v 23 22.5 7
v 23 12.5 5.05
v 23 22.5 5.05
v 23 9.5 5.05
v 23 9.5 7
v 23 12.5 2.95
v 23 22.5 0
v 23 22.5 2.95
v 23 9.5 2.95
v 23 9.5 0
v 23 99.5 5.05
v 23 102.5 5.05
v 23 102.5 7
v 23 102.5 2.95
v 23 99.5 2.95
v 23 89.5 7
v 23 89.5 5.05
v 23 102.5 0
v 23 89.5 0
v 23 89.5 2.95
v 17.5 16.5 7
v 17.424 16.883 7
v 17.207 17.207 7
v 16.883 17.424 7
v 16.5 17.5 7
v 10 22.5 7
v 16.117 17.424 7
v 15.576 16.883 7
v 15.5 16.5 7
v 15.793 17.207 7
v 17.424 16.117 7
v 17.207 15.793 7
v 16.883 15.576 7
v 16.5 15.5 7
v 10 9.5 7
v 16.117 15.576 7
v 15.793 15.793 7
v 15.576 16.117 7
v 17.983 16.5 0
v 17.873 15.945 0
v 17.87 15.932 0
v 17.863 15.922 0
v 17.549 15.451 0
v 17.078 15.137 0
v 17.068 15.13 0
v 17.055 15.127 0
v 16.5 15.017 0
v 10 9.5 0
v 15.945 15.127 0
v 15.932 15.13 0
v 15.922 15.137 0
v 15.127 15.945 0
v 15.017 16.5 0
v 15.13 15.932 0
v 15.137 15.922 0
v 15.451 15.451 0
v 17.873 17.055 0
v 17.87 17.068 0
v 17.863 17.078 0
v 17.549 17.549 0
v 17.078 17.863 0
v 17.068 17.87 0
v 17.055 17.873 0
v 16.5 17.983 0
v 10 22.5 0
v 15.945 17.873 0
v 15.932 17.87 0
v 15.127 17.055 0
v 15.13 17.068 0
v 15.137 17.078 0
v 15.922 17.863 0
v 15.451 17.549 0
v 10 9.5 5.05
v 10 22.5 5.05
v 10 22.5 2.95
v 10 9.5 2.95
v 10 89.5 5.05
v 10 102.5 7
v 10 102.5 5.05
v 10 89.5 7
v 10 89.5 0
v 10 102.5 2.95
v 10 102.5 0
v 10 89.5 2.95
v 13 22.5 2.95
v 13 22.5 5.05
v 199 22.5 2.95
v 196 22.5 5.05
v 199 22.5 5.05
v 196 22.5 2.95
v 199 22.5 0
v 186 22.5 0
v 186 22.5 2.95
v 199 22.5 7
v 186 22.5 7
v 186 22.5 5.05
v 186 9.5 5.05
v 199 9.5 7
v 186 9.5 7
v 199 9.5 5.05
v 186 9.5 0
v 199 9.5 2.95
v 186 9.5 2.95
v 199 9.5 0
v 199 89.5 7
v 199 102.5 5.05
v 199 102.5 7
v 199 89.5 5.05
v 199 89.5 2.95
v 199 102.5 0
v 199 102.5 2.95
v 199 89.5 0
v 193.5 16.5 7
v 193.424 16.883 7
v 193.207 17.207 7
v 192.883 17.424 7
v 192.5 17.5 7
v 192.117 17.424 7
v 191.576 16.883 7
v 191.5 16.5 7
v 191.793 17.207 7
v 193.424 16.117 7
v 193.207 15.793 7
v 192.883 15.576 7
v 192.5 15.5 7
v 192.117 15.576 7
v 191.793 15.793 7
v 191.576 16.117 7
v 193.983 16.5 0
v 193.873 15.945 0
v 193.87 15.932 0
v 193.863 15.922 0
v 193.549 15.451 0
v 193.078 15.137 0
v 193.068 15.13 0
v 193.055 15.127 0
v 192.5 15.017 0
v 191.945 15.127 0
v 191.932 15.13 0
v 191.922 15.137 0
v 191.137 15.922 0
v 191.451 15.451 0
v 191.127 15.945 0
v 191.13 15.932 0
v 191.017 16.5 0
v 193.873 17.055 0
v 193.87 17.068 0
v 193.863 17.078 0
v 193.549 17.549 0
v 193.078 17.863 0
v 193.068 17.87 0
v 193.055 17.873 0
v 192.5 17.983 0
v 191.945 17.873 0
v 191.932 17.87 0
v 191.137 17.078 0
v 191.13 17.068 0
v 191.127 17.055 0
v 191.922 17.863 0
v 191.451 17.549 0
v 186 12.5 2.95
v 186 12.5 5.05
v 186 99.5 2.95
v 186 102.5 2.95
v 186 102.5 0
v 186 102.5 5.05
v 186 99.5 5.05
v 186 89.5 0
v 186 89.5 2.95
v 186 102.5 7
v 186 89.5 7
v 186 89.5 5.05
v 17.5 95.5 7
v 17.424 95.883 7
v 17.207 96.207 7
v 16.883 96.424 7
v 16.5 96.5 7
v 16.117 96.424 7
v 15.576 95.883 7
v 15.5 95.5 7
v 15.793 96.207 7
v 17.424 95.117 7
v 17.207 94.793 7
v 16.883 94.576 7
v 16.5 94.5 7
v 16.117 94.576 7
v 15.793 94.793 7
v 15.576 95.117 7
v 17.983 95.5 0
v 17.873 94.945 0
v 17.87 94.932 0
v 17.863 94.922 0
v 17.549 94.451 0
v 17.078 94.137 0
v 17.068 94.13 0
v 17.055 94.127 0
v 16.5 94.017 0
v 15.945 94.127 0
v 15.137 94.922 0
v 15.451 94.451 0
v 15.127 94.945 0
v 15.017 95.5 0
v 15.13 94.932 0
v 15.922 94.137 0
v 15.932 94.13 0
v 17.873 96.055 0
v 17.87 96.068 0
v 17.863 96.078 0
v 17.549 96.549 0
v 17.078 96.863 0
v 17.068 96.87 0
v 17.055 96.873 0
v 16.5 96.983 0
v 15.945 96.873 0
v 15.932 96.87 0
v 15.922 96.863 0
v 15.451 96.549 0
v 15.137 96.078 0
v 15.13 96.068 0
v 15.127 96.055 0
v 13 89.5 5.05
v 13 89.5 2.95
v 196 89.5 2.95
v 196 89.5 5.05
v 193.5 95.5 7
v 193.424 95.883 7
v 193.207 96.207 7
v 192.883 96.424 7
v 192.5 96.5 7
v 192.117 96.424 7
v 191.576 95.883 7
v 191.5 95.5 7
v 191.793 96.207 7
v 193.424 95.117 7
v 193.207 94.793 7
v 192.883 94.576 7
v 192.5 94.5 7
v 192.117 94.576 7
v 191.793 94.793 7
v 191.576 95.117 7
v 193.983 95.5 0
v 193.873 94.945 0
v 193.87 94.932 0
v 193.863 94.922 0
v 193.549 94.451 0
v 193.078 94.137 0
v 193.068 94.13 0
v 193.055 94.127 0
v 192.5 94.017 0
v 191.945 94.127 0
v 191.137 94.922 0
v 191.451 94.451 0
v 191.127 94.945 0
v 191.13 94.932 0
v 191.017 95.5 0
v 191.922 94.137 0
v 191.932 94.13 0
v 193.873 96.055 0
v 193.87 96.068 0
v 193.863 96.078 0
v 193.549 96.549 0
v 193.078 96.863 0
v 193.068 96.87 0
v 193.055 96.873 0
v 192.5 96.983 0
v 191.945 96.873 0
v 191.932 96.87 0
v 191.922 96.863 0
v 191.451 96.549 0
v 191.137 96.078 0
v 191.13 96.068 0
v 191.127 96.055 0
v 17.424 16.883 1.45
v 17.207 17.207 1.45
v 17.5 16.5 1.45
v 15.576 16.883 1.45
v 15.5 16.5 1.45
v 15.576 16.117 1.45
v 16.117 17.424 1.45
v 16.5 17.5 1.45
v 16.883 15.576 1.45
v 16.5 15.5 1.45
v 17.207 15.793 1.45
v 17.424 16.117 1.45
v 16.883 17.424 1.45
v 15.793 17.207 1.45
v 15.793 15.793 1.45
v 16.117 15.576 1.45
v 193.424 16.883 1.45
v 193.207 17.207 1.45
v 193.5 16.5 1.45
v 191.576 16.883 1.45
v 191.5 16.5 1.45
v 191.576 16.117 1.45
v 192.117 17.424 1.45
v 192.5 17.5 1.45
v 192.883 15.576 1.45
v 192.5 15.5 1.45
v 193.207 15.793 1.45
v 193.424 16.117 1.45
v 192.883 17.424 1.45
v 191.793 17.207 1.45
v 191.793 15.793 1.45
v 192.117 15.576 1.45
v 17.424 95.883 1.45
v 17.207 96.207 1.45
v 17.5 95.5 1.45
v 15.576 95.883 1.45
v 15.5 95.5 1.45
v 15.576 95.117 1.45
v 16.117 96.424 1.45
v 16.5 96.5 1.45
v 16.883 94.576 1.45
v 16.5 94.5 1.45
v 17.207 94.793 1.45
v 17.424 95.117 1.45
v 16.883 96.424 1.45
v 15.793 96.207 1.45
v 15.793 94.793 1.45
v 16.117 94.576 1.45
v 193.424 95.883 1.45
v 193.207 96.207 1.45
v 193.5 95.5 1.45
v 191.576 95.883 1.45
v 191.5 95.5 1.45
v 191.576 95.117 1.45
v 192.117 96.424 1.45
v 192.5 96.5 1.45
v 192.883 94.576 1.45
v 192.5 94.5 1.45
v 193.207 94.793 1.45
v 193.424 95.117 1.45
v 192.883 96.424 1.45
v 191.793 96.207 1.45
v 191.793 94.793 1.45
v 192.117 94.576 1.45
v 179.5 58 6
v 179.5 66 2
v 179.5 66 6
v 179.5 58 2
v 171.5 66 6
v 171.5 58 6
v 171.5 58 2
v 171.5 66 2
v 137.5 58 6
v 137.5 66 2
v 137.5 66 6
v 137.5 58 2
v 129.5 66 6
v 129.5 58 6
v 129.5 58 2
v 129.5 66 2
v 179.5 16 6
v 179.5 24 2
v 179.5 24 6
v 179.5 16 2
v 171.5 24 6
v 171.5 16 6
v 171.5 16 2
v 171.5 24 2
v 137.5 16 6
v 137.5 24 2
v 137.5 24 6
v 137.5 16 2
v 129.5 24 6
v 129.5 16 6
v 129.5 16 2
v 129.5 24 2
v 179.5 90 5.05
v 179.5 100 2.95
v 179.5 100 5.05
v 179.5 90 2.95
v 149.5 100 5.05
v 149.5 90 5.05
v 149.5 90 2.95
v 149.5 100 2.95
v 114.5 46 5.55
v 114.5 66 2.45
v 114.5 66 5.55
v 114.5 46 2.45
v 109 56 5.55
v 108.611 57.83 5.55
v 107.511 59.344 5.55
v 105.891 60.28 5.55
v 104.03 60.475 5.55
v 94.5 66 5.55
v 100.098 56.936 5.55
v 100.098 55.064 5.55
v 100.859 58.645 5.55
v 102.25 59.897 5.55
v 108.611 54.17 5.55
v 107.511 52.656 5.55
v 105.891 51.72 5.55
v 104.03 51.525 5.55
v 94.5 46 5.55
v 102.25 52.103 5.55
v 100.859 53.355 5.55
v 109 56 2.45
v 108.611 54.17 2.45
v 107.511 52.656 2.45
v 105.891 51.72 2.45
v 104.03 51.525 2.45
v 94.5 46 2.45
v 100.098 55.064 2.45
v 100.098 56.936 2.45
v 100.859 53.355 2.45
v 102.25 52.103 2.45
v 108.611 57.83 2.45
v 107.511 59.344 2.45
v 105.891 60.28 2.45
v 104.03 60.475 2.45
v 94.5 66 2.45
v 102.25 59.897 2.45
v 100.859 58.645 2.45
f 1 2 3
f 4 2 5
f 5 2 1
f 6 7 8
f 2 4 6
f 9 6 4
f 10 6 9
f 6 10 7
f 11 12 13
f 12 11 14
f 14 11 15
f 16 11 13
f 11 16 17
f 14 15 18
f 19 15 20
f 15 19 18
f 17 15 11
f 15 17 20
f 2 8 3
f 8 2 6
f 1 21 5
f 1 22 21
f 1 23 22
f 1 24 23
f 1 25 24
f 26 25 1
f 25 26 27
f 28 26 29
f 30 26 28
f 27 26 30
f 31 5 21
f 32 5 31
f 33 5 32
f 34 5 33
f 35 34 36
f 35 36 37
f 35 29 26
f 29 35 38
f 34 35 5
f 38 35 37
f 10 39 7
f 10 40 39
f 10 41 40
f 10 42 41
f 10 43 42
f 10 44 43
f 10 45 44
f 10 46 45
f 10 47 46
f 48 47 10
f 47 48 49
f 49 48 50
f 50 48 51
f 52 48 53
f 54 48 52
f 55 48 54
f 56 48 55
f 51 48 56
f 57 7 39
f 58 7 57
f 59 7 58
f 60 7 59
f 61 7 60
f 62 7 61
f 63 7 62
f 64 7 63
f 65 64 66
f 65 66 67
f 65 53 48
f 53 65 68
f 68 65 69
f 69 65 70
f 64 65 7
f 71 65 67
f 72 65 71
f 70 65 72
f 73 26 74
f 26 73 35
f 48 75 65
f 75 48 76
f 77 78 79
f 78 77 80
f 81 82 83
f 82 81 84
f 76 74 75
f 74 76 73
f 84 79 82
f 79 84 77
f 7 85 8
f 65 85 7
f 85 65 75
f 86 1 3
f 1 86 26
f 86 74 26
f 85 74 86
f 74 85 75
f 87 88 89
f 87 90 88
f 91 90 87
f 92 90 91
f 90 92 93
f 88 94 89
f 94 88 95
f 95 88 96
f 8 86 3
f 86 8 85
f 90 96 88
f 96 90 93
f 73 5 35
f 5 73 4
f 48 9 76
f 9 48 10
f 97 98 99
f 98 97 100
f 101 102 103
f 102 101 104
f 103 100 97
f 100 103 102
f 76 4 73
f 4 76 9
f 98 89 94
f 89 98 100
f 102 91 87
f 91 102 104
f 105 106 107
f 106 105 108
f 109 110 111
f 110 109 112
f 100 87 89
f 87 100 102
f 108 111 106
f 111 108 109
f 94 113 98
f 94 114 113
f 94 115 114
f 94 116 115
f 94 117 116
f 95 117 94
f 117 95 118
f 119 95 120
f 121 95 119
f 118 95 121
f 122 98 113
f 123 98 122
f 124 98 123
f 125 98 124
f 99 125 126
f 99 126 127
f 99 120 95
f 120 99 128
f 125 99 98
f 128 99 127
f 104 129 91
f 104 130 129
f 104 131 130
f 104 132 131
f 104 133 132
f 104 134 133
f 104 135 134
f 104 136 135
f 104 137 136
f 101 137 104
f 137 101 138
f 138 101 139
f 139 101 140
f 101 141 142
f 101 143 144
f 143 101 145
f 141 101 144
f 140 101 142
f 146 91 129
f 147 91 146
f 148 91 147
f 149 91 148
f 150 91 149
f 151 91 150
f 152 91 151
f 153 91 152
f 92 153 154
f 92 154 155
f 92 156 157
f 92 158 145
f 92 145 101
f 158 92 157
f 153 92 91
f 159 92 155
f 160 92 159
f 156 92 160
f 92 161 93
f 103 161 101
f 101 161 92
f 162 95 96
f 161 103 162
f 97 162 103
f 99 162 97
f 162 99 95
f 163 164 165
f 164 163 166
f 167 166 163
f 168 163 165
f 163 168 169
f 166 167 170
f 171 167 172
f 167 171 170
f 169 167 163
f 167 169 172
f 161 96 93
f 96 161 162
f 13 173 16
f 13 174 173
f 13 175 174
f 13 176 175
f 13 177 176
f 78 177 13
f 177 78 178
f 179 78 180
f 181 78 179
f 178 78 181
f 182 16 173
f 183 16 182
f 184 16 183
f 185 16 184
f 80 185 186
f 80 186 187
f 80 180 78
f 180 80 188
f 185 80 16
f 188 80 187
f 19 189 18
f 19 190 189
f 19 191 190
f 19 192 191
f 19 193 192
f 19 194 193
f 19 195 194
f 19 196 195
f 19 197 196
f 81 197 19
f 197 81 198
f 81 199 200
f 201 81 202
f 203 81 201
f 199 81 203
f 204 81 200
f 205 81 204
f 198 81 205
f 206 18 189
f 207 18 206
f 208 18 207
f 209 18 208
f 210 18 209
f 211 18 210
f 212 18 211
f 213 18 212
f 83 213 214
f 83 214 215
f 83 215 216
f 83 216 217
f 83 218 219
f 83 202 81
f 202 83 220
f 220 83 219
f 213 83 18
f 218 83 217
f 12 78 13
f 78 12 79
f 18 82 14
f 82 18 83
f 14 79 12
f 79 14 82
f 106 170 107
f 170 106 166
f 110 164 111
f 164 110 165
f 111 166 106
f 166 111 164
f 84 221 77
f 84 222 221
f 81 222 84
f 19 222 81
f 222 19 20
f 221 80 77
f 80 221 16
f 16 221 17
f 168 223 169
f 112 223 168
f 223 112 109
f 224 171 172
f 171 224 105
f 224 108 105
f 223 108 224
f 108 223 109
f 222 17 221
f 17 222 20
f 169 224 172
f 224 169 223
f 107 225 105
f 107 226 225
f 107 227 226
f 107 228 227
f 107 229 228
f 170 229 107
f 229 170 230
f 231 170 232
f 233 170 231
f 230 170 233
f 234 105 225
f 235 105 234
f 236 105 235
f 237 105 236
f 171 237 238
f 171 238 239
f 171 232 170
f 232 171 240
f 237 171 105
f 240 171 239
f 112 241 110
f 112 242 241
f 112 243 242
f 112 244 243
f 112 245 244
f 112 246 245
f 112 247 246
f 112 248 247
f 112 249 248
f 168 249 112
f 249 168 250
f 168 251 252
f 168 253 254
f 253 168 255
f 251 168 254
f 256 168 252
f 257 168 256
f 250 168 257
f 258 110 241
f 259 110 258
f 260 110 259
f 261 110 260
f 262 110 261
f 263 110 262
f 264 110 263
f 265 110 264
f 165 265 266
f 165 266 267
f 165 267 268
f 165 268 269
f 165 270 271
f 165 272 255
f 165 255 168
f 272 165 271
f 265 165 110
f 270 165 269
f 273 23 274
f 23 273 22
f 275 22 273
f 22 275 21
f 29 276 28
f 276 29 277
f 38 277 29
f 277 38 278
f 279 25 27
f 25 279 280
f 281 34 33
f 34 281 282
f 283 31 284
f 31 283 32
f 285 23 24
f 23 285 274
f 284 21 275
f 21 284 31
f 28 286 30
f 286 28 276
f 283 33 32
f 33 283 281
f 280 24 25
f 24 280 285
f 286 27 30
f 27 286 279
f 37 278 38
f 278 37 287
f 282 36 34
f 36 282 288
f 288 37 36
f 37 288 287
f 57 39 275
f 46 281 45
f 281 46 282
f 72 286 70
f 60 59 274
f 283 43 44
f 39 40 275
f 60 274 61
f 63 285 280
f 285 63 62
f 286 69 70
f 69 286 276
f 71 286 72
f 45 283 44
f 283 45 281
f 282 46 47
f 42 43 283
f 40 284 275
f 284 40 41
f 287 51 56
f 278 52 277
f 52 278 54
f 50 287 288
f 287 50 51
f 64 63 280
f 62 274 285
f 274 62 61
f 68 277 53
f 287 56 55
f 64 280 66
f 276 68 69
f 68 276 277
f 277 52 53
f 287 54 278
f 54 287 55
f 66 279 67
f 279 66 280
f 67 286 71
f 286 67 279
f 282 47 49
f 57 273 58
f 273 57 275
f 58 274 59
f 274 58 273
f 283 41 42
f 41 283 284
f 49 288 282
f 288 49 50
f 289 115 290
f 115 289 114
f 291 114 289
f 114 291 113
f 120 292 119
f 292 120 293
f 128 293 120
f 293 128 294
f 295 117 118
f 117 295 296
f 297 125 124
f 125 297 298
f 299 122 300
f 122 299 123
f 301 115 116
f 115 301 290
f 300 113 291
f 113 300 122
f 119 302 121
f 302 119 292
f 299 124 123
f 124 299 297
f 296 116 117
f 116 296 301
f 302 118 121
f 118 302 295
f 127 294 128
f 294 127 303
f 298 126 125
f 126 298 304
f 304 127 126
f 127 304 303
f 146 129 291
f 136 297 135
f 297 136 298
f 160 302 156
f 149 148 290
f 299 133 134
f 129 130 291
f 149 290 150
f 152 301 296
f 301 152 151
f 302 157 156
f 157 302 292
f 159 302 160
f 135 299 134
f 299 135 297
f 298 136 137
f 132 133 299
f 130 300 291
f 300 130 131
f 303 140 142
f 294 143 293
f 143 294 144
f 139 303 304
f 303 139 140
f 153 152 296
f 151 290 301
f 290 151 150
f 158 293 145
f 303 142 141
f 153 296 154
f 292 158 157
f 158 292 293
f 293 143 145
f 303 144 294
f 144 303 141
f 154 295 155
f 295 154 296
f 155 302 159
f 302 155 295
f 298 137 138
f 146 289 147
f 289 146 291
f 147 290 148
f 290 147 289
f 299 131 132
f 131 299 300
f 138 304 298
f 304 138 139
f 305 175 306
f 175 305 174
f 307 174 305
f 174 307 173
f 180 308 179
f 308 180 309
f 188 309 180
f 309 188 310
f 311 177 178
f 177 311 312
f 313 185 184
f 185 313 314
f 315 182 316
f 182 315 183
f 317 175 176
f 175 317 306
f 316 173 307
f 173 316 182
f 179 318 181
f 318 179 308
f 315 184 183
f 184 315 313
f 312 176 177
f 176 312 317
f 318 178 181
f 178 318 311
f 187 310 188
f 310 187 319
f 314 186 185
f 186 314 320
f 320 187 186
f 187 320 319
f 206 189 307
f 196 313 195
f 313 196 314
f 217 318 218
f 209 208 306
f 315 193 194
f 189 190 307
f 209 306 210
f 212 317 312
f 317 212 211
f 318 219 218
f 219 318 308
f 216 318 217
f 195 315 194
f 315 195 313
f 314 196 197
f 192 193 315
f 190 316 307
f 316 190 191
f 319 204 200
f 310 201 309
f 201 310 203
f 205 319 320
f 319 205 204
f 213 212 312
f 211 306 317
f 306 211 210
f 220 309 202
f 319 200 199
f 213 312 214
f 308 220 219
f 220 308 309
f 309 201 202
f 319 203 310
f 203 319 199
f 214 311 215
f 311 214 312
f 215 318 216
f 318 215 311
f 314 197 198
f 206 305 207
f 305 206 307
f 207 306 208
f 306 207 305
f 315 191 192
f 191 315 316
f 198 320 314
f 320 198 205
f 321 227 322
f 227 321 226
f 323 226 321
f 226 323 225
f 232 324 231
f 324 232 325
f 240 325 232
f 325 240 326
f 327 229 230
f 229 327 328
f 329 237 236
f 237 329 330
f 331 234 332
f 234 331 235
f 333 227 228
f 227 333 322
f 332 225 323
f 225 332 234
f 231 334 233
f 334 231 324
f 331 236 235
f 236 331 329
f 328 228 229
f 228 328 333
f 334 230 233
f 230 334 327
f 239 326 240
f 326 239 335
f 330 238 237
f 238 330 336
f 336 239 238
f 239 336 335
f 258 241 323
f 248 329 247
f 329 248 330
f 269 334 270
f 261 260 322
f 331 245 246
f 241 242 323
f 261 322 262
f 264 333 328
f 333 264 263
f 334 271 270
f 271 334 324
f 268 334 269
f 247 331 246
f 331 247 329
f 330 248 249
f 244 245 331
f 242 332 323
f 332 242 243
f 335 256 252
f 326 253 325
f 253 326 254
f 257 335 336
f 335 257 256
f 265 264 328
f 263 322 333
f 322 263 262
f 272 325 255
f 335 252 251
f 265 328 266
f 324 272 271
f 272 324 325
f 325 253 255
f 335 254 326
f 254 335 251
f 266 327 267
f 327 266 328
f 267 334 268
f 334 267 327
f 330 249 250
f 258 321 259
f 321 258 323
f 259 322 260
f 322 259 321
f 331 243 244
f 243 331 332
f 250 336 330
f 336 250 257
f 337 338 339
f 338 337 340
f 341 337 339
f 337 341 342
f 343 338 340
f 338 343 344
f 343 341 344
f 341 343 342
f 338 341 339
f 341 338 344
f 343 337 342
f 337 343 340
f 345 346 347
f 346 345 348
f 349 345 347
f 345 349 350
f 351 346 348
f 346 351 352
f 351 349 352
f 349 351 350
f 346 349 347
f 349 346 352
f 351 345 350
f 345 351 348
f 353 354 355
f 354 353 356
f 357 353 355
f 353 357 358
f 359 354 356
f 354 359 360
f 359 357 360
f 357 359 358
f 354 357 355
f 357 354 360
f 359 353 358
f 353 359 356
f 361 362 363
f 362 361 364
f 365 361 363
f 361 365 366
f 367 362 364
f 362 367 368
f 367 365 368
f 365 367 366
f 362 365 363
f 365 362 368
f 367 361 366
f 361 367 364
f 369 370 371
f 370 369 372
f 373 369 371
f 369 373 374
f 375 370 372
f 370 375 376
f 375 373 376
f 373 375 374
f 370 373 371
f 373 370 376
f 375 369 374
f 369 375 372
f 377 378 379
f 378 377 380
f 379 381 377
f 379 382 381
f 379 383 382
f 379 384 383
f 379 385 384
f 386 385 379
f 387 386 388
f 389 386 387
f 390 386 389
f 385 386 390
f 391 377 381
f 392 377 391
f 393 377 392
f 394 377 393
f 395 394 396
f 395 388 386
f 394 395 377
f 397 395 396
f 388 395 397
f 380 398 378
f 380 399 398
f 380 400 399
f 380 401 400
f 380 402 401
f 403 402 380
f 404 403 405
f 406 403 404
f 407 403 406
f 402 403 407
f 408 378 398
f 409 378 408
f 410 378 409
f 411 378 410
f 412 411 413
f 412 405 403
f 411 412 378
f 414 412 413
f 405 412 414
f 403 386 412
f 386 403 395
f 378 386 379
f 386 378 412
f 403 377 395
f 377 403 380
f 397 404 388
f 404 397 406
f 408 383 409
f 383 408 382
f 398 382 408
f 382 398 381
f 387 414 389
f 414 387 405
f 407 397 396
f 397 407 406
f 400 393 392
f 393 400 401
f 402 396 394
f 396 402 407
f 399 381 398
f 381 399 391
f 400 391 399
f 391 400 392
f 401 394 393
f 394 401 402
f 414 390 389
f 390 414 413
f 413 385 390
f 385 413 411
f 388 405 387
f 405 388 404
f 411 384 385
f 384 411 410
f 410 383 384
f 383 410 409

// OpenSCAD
// file: Defines_v1.scad
/* spacing between the leds
 * usually around 12, can be forced
 * to 6-10 by bending strip
 */
space = 6;  

/* some space for the outermost leds
 * for better viewing angle
 */
margin = 10;

/* 15 leds (type 5050) with above spacing */
width = 15 * (5 + space) + 10 + 2 * margin;

/* box height, min. 42mm */
height = 47;

/* box depth, min 100mm for 4x3-keypad */
depth = 105;

/* max wall thickness */
thick=10;

/* grade of feet smoothness
 * below 10 looks bad
 * 10-16 is reasonable
 * above 16 takes much time to render
 */
grade = 12;

/* length of side stands 
 * should be enough to get box in right angle
 * should not exceed back of box
 */
stand = min(height + 20, depth - 40);

/* offset of usb plug from center */
usb_offs = 60;

/* calculated values */
bwidth = width + 14;
bheight = depth + 7;

/* size of led holes 
 * includes some margin for 5050 leds
 */
led = 5.75;

minimal = 1;
// main file
include <Defines_v1.scad>;

module hole() {
    union() {
        translate([0, 0, 3.5]) cylinder(7.1, 1, 1, $fn=16, center = true);
        translate([0, 0, 0.7]) cylinder(1.5, 1.5, 1, $fn=16, center = true);
    }
}

module Boden() {
    difference() {
        union() {
            difference() {
                union() {
                    //translate([bwidth / 2, bheight / 2, 2.5]) 
                    //    cube([bwidth, bheight, 5], center = true);
                    translate([16.5, 16, 3.5]) 
                        cube([13, 13, 7], center = true);
                    translate([bwidth-16.5, 16, 3.5]) 
                        cube([13, 13, 7], center = true);
                    translate([16.5, bheight-16, 3.5]) 
                        cube([13, 13, 7], center = true);
                    translate([bwidth-16.5, bheight-16, 3.5]) 
                        cube([13, 13, 7], center = true);
                }

                translate([bwidth - 6.5, bheight / 2, 4]) 
                    cube([7, depth + 2, 2.1], center = true);

                translate([6.5, bheight / 2, 4]) 
                    cube([7, depth + 2, 2.1], center = true);

                translate([bwidth / 2, 7.5, 4]) 
                    cube([width, 4, 2.1], center = true);

                translate([bwidth / 2, bheight - 7.5, 4]) 
                    cube([width, 4, 2.1], center = true);

                translate([bwidth / 2, bheight / 2, 4]) 
                    cube([width - 12, depth - 38, 2.1], center = true);

                translate([bwidth / 2, bheight / 2, 4]) 
                    cube([width - 32, depth - 18, 2.1], center = true);

                translate([16.5, 16.5, 0]) hole();
                translate([bwidth - 16.5, 16.5, 0]) hole();
                translate([16.5, bheight - 16.5, 0]) hole();
                translate([bwidth - 16.5, bheight - 16.5, 0]) hole();
            }

            translate([bwidth / 2 + usb_offs, bheight - 17, 4])
                cube([30, 10, 2.1], center = true);

            translate([bwidth / 2, bheight / 2, 4])
                cube([20, 20, 3.1], center = true);
            
            translate([bwidth / 2 + 50, bheight / 2 - 15, 4])
            {
                translate([21, 21, 0])
                    cube([8, 8, 4], center = true);
                translate([-21, 21, 0])
                    cube([8, 8, 4], center = true);
                translate([21, -21, 0])
                    cube([8, 8, 4], center = true);
                translate([-21, -21, 0])
                    cube([8, 8, 4], center = true);
            }
        }
        translate([bwidth / 2, bheight / 2, 4]) 
            cylinder(10, 4.5, 4.5, center = true);
    }
}

Boden();
